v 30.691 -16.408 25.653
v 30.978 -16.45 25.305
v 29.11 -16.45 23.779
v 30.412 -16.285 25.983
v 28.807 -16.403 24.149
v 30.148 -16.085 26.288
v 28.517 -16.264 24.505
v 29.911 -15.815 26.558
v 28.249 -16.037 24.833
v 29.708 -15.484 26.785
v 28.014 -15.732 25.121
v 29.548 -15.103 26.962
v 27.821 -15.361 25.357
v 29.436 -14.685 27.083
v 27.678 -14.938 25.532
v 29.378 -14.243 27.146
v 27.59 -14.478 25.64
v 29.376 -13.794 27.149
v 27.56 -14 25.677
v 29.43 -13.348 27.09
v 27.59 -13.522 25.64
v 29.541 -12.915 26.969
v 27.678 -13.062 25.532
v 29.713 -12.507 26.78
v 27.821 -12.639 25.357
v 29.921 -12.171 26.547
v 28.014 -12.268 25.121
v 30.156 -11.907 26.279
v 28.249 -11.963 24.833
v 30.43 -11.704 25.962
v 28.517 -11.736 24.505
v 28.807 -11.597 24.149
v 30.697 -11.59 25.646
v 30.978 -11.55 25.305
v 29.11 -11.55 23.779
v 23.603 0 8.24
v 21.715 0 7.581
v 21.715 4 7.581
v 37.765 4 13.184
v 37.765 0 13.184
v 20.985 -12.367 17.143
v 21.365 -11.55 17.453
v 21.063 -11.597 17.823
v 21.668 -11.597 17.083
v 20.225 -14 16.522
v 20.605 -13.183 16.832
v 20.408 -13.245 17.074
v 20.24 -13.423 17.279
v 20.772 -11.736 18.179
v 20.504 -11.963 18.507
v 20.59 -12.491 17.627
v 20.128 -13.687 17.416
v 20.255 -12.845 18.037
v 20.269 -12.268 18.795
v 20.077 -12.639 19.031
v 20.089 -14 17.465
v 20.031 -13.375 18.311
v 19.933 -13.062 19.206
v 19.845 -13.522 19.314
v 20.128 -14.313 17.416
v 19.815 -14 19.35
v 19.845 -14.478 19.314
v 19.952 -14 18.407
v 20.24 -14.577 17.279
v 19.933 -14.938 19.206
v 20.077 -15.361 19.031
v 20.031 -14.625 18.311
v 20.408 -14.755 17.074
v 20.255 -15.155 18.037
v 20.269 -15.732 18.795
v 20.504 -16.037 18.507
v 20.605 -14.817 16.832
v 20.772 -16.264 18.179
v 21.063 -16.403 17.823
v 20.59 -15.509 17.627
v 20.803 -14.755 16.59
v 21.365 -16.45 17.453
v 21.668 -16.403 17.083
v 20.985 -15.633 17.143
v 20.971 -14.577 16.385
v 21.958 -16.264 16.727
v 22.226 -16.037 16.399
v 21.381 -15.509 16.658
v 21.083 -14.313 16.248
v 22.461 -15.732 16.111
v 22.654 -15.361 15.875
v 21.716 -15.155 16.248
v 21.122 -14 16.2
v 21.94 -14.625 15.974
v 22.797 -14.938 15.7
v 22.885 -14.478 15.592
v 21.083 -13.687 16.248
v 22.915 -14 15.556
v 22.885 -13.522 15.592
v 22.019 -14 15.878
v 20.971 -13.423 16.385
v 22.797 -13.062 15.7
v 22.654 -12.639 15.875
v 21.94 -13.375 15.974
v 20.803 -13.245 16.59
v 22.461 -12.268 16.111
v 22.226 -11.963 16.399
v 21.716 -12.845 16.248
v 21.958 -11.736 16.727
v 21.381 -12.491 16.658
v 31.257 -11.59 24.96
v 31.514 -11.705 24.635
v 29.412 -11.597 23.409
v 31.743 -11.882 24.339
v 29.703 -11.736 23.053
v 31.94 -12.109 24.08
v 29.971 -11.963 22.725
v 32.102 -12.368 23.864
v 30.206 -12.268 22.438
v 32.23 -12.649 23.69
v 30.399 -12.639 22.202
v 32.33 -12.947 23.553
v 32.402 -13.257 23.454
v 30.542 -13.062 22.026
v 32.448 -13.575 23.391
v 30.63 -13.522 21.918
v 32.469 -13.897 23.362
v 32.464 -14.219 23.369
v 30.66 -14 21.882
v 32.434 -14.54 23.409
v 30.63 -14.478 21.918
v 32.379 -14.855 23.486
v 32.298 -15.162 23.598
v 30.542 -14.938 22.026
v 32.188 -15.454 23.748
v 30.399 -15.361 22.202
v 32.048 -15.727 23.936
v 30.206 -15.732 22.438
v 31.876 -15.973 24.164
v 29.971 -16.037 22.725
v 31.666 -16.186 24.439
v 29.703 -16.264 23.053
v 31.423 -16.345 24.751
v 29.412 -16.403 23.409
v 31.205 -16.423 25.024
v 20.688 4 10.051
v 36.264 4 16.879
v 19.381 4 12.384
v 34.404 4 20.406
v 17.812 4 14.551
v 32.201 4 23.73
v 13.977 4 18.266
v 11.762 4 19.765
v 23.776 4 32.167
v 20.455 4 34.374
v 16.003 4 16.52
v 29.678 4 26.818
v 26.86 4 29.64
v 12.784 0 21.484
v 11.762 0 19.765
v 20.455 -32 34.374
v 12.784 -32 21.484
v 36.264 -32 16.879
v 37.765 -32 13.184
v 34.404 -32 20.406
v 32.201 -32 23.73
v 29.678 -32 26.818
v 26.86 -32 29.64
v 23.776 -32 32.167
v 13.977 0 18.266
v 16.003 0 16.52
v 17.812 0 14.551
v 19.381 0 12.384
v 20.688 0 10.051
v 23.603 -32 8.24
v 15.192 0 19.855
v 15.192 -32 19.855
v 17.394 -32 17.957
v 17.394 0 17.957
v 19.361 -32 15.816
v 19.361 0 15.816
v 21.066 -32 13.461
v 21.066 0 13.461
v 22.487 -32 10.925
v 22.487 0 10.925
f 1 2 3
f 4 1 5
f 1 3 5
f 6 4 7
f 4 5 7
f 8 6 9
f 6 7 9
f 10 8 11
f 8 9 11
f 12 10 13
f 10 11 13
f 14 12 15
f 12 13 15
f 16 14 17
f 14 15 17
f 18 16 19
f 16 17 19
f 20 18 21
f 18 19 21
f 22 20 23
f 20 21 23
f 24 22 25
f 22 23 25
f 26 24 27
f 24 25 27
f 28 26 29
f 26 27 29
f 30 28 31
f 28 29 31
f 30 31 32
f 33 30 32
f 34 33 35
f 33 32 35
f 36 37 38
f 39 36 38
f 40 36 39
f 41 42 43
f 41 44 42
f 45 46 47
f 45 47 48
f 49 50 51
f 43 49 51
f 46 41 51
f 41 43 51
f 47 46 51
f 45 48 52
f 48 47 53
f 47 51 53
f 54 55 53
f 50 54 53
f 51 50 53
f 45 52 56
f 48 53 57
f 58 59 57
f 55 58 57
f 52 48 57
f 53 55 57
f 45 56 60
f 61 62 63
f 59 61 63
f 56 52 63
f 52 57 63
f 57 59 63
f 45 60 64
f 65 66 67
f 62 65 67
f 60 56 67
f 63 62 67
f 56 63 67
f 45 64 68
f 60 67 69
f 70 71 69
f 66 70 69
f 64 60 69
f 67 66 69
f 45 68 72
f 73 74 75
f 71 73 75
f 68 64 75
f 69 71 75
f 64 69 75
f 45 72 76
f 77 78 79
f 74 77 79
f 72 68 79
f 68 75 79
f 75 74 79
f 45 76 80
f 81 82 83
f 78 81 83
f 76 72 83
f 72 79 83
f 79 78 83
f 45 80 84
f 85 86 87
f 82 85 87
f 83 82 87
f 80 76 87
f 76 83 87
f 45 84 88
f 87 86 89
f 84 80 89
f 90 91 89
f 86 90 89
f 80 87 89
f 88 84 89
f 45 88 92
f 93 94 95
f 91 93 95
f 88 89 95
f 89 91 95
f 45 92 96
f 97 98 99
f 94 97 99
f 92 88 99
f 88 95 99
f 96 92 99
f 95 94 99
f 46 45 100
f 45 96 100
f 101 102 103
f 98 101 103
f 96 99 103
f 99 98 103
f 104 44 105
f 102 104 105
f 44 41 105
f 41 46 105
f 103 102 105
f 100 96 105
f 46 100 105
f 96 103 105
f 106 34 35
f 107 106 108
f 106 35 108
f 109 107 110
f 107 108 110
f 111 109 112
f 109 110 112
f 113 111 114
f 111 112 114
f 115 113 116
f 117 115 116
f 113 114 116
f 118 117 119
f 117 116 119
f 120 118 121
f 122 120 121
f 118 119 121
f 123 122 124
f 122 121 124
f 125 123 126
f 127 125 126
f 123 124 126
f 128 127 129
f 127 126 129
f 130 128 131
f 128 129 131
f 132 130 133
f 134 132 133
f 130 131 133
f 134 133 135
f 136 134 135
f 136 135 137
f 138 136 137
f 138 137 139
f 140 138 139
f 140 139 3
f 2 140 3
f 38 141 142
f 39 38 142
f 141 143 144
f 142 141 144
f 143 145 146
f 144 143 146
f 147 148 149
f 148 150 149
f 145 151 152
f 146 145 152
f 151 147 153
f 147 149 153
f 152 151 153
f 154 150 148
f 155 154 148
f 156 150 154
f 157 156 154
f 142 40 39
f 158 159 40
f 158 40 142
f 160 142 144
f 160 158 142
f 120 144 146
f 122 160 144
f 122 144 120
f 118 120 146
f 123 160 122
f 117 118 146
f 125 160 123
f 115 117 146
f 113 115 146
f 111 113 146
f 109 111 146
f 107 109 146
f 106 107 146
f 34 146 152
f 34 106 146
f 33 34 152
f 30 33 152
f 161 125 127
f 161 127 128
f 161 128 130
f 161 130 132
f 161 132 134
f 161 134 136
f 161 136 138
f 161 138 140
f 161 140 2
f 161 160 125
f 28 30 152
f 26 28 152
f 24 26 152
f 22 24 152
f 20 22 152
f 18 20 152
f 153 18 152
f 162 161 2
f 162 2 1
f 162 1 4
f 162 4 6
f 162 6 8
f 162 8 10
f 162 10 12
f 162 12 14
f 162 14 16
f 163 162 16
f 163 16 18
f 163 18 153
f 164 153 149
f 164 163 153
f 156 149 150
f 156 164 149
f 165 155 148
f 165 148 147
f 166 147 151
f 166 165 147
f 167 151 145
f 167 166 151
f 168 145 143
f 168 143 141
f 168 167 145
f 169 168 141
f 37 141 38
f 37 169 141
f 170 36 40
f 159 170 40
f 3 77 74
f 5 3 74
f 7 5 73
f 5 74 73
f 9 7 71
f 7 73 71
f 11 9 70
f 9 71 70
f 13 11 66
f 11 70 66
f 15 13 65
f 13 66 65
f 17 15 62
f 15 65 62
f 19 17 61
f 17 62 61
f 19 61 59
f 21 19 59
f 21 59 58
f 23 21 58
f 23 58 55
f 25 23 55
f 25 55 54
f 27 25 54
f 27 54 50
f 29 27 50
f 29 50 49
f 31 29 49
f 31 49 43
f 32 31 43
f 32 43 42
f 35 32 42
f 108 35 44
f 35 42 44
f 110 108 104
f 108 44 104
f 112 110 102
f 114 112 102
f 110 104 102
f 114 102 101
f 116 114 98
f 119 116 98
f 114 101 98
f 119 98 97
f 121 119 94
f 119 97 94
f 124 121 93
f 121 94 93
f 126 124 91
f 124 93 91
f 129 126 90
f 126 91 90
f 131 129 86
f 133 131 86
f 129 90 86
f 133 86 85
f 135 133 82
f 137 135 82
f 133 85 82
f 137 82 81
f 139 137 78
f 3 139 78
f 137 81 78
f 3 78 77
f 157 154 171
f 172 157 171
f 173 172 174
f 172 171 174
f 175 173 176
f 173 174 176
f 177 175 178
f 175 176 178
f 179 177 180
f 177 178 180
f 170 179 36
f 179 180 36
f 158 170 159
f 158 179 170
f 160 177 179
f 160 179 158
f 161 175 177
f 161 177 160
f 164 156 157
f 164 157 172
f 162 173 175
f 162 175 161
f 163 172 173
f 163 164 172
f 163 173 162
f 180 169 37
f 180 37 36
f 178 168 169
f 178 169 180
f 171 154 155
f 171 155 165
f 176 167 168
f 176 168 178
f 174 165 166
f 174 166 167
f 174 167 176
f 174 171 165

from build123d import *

# Parameters (mm, degrees)
F2_DEPTH = 32
F3_DEPTH = 4
F6_D     = 4.9
F6_DEPTH = 10
F6_TIP   = 1.4721085166
F7_D     = 4.9
F7_DEPTH = 10
F7_TIP   = 1.4721085166


with BuildPart() as f2:
    # F0 (on Front) → F2 (new body)
    with BuildSketch(Plane.XZ):
        with BuildLine():
            Line((23.6029717884, 8.2401288069), (37.7647548615, 13.1842060911))
            ThreePointArc((37.7647548615, 13.1842060911), (30.9779974122, 25.3054080451), (20.4548362885, 34.3744043208))
            Line((20.4548362885, 34.3744043208), (12.7842726803, 21.4840027005))
            ThreePointArc((12.7842726803, 21.4840027005), (19.3612483826, 15.8158800282), (23.6029717884, 8.2401288069))
        make_face()
    extrude(amount=F2_DEPTH)

    # F1 (on Front) + F0 (on Front) → F3 (join)
    with BuildSketch(Plane.XZ):
        with BuildLine():
            ThreePointArc((11.7615308659, 19.7652824845), (17.812348512, 14.5506096259), (21.7147340454, 7.5809185024))
            Line((21.7147340454, 7.5809185024), (37.7647548615, 13.1842060911))
            ThreePointArc((37.7647548615, 13.1842060911), (30.9779974122, 25.3054080451), (20.4548362885, 34.3744043208))
            Line((20.4548362885, 34.3744043208), (11.7615308659, 19.7652824845))
        make_face()
    with BuildSketch(Plane.XZ):
        with BuildLine():
            Line((23.6029717884, 8.2401288069), (37.7647548615, 13.1842060911))
            ThreePointArc((37.7647548615, 13.1842060911), (30.9779974122, 25.3054080451), (20.4548362885, 34.3744043208))
            Line((20.4548362885, 34.3744043208), (12.7842726803, 21.4840027005))
            ThreePointArc((12.7842726803, 21.4840027005), (19.3612483826, 15.8158800282), (23.6029717884, 8.2401288069))
        make_face()
    extrude(amount=-F3_DEPTH)

    # F6 (one way)
    with BuildSketch(Plane(origin=(29.109795575, 0, 23.7793052059), x_dir=(0, 1, 0), z_dir=(-0.7744499353, 0, -0.6326352011))):
        with Locations((-14, 0)):
            Circle(F6_D / 2)
    extrude(amount=-F6_DEPTH, mode=Mode.SUBTRACT)
    with Locations(Plane(origin=(29.109795575, 0, 23.7793052059), x_dir=(0, 1, 0), z_dir=(-0.7744499353, 0, -0.6326352011))):
        with Locations((-14, 0)):
            with Locations((0, 0, -(F6_DEPTH + F6_TIP / 2))):  # 118° drill point
                Cone(0, F6_D / 2, F6_TIP, mode=Mode.SUBTRACT)

    # F7
    with Locations(Plane(origin=(29.109795575, 0, 23.7793052059), x_dir=(0, 1, 0), z_dir=(0.7744499353, 0, 0.6326352011))):
        with Locations((-14, 0)):
            Hole(F7_D / 2, depth=F7_DEPTH)
            with Locations((0, 0, -(F7_DEPTH + F7_TIP / 2))):  # 118° drill point
                Cone(0, F7_D / 2, F7_TIP, mode=Mode.SUBTRACT)


solid = f2.part
